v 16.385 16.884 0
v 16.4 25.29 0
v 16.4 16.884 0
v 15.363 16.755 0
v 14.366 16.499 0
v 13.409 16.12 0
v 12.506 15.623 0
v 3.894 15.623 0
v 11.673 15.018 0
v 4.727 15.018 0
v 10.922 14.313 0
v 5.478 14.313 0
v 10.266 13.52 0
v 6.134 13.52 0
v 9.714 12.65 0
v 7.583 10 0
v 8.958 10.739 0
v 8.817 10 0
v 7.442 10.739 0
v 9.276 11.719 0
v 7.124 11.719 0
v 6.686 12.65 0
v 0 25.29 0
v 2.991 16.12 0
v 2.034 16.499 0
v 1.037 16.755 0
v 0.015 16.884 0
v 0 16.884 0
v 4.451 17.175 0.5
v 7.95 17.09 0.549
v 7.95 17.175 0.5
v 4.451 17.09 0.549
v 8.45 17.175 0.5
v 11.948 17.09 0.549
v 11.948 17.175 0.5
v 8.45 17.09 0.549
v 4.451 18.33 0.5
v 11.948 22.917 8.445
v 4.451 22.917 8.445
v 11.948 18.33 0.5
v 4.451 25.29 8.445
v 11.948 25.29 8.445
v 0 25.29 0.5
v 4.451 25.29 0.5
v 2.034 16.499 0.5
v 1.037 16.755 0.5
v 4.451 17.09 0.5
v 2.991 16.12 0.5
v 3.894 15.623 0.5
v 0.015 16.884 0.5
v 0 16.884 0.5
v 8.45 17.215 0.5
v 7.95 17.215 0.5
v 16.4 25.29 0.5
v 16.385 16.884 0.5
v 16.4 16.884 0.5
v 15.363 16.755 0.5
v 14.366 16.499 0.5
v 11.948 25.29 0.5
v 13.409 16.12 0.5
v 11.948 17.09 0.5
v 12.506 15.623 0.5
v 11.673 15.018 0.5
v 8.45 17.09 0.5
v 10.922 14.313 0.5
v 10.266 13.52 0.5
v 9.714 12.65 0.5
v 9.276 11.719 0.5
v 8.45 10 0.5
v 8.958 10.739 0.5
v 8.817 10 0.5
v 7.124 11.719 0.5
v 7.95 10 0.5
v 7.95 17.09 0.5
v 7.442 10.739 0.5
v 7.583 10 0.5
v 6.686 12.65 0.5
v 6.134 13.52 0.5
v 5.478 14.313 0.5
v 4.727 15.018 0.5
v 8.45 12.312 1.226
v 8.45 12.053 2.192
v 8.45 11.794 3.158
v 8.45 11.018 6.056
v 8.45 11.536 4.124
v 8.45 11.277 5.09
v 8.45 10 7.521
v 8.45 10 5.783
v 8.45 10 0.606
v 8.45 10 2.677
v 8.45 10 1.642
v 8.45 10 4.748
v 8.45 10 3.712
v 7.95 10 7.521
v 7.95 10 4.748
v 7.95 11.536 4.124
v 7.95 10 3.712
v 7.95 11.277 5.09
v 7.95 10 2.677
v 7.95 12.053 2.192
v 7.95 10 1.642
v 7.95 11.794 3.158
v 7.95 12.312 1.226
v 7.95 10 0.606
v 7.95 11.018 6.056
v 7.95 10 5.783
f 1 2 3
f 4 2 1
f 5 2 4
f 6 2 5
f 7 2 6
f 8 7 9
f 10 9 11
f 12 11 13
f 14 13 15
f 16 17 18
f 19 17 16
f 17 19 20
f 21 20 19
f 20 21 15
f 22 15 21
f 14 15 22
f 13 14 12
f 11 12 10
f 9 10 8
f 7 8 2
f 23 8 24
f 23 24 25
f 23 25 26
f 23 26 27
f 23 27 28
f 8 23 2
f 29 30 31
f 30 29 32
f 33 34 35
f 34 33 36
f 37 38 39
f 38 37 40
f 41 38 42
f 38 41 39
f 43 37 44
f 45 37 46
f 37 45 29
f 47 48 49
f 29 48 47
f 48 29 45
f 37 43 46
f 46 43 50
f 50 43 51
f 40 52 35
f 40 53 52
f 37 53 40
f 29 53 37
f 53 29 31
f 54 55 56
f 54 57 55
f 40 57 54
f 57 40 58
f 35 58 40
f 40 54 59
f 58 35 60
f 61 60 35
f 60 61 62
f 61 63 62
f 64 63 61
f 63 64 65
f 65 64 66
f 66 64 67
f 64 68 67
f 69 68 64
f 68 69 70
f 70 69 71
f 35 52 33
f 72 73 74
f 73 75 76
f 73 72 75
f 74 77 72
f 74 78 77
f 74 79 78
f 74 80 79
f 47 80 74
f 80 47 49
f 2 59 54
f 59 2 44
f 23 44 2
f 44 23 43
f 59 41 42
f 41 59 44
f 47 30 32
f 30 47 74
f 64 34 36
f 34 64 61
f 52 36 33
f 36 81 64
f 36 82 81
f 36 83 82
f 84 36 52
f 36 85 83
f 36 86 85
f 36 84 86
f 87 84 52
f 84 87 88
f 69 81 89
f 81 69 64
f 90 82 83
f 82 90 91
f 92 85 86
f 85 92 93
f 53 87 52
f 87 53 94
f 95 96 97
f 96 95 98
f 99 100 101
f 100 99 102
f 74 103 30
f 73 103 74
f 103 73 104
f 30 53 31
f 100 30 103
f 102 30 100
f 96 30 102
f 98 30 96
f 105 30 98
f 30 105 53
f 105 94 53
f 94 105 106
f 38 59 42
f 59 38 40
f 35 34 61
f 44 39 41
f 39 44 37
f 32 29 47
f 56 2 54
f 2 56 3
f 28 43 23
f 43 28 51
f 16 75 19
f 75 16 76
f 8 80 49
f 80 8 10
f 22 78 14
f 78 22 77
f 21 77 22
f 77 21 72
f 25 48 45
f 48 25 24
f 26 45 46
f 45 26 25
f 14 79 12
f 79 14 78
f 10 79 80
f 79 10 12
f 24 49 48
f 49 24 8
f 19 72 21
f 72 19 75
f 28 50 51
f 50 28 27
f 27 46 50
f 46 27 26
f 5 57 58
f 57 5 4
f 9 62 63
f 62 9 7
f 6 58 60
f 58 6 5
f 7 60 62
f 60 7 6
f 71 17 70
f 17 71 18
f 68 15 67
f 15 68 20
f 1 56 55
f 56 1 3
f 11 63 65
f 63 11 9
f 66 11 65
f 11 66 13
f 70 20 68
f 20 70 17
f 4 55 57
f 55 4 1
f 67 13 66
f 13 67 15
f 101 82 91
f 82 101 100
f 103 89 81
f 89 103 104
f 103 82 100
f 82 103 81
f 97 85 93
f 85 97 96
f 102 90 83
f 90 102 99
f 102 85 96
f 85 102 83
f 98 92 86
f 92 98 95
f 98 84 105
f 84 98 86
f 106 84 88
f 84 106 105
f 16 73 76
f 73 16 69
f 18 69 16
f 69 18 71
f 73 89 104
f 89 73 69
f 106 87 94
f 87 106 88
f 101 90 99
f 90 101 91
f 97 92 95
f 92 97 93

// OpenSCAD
$fn = 50;

module holder() {
    union() {
        difference() {
            union() {
                difference() {
                    union() {
                        cube([16.4, 0.5, 16.89]);
                        translate([0, 0, 16.89]) {
                            rotate([-30, 0, 0]) {
                                cube([16.4, 0.5, 3.315]);
                            };
                        };
                    };
                    hull() {
                        translate([8.2, 4.22, 18.48]) {
                            rotate([60, 0, 0]) {
                                cylinder(h=5.5, r=2.6775);
                            };
                        };
                        translate([8.2, 5.495, 21.03]) {
                            rotate([60, 0, 0]) {
                                cylinder(h=5.5, r=3.7485);
                            };
                        };
                    };
                };
                difference() {
                    translate([0, 17.09, 0.5]) {
                        cube([16.4, 8.2, 13.12]);
                    };
                    union() {
                        translate([-0.25, 10.94, 4.1]) {
                            rotate([-30, 0, 0]) {
                                cube([16.9, 8.2, 19.68]);
                            };
                        };
                        translate([0, 17.59, 8.445]) {
                            cube([16.9, 8.2, 19.68]);
                        };
                    };
                };
                translate([8.45, 0, 0]) {
                    rotate([0, -90, 0]) {
                        linear_extrude(height=0.5) {
                            polygon([[0.5, 0.5], [16.765, 0.5], [0.5, 17.215]]);
                        };
                    };
                };
            };
            translate([11.9485, -1, -1]) {
                cube([8.2, 27.29, 21.1]);
            };
            translate([-3.7485, -1, -1]) {
                cube([8.2, 27.29, 21.1]);
            };
        };
        difference() {
            cube([16.4, 25.29, 0.5]);
            translate([-0.5, 8.7, -1]) {
                cylinder(h=17.39, r=8.2);
            };
            translate([16.9, 8.7, -1]) {
                cylinder(h=17.39, r=8.2);
            };
        };
    };
}

module connector() {
    translate([3.2, 8, -2]) {
        rotate([15, 0, 0]) {
            translate([-1, 2, 2]) {
                cube([12, 3, 1]);
            }
        }
        
        rotate([15, 0, 0]) {
            translate([-1, 2, 4]) {
                cube([12, 3, 1]);
            }
        }
        
        rotate([15, 0, 0]) {
            translate([-1, 2, 6]) {
                cube([12, 3, 1]);
            }
        }
    }
}

module front_cutoff() {
    union() {
        translate([-1, -1, -1]) {
            cube([20, 11, 22]);
        }
        connector();
    }
}

module rear_cutoff() {
    difference() {
        translate([-1, 10, -1]) {
            cube([20, 20, 22]);
        }
        connector();
    }
}

module rear_part() {
    difference() {
        holder();
        front_cutoff();
    }
}

module front_part() {
    difference() {
        holder();
        rear_cutoff();
    }
}

//front_part();
rear_part();
